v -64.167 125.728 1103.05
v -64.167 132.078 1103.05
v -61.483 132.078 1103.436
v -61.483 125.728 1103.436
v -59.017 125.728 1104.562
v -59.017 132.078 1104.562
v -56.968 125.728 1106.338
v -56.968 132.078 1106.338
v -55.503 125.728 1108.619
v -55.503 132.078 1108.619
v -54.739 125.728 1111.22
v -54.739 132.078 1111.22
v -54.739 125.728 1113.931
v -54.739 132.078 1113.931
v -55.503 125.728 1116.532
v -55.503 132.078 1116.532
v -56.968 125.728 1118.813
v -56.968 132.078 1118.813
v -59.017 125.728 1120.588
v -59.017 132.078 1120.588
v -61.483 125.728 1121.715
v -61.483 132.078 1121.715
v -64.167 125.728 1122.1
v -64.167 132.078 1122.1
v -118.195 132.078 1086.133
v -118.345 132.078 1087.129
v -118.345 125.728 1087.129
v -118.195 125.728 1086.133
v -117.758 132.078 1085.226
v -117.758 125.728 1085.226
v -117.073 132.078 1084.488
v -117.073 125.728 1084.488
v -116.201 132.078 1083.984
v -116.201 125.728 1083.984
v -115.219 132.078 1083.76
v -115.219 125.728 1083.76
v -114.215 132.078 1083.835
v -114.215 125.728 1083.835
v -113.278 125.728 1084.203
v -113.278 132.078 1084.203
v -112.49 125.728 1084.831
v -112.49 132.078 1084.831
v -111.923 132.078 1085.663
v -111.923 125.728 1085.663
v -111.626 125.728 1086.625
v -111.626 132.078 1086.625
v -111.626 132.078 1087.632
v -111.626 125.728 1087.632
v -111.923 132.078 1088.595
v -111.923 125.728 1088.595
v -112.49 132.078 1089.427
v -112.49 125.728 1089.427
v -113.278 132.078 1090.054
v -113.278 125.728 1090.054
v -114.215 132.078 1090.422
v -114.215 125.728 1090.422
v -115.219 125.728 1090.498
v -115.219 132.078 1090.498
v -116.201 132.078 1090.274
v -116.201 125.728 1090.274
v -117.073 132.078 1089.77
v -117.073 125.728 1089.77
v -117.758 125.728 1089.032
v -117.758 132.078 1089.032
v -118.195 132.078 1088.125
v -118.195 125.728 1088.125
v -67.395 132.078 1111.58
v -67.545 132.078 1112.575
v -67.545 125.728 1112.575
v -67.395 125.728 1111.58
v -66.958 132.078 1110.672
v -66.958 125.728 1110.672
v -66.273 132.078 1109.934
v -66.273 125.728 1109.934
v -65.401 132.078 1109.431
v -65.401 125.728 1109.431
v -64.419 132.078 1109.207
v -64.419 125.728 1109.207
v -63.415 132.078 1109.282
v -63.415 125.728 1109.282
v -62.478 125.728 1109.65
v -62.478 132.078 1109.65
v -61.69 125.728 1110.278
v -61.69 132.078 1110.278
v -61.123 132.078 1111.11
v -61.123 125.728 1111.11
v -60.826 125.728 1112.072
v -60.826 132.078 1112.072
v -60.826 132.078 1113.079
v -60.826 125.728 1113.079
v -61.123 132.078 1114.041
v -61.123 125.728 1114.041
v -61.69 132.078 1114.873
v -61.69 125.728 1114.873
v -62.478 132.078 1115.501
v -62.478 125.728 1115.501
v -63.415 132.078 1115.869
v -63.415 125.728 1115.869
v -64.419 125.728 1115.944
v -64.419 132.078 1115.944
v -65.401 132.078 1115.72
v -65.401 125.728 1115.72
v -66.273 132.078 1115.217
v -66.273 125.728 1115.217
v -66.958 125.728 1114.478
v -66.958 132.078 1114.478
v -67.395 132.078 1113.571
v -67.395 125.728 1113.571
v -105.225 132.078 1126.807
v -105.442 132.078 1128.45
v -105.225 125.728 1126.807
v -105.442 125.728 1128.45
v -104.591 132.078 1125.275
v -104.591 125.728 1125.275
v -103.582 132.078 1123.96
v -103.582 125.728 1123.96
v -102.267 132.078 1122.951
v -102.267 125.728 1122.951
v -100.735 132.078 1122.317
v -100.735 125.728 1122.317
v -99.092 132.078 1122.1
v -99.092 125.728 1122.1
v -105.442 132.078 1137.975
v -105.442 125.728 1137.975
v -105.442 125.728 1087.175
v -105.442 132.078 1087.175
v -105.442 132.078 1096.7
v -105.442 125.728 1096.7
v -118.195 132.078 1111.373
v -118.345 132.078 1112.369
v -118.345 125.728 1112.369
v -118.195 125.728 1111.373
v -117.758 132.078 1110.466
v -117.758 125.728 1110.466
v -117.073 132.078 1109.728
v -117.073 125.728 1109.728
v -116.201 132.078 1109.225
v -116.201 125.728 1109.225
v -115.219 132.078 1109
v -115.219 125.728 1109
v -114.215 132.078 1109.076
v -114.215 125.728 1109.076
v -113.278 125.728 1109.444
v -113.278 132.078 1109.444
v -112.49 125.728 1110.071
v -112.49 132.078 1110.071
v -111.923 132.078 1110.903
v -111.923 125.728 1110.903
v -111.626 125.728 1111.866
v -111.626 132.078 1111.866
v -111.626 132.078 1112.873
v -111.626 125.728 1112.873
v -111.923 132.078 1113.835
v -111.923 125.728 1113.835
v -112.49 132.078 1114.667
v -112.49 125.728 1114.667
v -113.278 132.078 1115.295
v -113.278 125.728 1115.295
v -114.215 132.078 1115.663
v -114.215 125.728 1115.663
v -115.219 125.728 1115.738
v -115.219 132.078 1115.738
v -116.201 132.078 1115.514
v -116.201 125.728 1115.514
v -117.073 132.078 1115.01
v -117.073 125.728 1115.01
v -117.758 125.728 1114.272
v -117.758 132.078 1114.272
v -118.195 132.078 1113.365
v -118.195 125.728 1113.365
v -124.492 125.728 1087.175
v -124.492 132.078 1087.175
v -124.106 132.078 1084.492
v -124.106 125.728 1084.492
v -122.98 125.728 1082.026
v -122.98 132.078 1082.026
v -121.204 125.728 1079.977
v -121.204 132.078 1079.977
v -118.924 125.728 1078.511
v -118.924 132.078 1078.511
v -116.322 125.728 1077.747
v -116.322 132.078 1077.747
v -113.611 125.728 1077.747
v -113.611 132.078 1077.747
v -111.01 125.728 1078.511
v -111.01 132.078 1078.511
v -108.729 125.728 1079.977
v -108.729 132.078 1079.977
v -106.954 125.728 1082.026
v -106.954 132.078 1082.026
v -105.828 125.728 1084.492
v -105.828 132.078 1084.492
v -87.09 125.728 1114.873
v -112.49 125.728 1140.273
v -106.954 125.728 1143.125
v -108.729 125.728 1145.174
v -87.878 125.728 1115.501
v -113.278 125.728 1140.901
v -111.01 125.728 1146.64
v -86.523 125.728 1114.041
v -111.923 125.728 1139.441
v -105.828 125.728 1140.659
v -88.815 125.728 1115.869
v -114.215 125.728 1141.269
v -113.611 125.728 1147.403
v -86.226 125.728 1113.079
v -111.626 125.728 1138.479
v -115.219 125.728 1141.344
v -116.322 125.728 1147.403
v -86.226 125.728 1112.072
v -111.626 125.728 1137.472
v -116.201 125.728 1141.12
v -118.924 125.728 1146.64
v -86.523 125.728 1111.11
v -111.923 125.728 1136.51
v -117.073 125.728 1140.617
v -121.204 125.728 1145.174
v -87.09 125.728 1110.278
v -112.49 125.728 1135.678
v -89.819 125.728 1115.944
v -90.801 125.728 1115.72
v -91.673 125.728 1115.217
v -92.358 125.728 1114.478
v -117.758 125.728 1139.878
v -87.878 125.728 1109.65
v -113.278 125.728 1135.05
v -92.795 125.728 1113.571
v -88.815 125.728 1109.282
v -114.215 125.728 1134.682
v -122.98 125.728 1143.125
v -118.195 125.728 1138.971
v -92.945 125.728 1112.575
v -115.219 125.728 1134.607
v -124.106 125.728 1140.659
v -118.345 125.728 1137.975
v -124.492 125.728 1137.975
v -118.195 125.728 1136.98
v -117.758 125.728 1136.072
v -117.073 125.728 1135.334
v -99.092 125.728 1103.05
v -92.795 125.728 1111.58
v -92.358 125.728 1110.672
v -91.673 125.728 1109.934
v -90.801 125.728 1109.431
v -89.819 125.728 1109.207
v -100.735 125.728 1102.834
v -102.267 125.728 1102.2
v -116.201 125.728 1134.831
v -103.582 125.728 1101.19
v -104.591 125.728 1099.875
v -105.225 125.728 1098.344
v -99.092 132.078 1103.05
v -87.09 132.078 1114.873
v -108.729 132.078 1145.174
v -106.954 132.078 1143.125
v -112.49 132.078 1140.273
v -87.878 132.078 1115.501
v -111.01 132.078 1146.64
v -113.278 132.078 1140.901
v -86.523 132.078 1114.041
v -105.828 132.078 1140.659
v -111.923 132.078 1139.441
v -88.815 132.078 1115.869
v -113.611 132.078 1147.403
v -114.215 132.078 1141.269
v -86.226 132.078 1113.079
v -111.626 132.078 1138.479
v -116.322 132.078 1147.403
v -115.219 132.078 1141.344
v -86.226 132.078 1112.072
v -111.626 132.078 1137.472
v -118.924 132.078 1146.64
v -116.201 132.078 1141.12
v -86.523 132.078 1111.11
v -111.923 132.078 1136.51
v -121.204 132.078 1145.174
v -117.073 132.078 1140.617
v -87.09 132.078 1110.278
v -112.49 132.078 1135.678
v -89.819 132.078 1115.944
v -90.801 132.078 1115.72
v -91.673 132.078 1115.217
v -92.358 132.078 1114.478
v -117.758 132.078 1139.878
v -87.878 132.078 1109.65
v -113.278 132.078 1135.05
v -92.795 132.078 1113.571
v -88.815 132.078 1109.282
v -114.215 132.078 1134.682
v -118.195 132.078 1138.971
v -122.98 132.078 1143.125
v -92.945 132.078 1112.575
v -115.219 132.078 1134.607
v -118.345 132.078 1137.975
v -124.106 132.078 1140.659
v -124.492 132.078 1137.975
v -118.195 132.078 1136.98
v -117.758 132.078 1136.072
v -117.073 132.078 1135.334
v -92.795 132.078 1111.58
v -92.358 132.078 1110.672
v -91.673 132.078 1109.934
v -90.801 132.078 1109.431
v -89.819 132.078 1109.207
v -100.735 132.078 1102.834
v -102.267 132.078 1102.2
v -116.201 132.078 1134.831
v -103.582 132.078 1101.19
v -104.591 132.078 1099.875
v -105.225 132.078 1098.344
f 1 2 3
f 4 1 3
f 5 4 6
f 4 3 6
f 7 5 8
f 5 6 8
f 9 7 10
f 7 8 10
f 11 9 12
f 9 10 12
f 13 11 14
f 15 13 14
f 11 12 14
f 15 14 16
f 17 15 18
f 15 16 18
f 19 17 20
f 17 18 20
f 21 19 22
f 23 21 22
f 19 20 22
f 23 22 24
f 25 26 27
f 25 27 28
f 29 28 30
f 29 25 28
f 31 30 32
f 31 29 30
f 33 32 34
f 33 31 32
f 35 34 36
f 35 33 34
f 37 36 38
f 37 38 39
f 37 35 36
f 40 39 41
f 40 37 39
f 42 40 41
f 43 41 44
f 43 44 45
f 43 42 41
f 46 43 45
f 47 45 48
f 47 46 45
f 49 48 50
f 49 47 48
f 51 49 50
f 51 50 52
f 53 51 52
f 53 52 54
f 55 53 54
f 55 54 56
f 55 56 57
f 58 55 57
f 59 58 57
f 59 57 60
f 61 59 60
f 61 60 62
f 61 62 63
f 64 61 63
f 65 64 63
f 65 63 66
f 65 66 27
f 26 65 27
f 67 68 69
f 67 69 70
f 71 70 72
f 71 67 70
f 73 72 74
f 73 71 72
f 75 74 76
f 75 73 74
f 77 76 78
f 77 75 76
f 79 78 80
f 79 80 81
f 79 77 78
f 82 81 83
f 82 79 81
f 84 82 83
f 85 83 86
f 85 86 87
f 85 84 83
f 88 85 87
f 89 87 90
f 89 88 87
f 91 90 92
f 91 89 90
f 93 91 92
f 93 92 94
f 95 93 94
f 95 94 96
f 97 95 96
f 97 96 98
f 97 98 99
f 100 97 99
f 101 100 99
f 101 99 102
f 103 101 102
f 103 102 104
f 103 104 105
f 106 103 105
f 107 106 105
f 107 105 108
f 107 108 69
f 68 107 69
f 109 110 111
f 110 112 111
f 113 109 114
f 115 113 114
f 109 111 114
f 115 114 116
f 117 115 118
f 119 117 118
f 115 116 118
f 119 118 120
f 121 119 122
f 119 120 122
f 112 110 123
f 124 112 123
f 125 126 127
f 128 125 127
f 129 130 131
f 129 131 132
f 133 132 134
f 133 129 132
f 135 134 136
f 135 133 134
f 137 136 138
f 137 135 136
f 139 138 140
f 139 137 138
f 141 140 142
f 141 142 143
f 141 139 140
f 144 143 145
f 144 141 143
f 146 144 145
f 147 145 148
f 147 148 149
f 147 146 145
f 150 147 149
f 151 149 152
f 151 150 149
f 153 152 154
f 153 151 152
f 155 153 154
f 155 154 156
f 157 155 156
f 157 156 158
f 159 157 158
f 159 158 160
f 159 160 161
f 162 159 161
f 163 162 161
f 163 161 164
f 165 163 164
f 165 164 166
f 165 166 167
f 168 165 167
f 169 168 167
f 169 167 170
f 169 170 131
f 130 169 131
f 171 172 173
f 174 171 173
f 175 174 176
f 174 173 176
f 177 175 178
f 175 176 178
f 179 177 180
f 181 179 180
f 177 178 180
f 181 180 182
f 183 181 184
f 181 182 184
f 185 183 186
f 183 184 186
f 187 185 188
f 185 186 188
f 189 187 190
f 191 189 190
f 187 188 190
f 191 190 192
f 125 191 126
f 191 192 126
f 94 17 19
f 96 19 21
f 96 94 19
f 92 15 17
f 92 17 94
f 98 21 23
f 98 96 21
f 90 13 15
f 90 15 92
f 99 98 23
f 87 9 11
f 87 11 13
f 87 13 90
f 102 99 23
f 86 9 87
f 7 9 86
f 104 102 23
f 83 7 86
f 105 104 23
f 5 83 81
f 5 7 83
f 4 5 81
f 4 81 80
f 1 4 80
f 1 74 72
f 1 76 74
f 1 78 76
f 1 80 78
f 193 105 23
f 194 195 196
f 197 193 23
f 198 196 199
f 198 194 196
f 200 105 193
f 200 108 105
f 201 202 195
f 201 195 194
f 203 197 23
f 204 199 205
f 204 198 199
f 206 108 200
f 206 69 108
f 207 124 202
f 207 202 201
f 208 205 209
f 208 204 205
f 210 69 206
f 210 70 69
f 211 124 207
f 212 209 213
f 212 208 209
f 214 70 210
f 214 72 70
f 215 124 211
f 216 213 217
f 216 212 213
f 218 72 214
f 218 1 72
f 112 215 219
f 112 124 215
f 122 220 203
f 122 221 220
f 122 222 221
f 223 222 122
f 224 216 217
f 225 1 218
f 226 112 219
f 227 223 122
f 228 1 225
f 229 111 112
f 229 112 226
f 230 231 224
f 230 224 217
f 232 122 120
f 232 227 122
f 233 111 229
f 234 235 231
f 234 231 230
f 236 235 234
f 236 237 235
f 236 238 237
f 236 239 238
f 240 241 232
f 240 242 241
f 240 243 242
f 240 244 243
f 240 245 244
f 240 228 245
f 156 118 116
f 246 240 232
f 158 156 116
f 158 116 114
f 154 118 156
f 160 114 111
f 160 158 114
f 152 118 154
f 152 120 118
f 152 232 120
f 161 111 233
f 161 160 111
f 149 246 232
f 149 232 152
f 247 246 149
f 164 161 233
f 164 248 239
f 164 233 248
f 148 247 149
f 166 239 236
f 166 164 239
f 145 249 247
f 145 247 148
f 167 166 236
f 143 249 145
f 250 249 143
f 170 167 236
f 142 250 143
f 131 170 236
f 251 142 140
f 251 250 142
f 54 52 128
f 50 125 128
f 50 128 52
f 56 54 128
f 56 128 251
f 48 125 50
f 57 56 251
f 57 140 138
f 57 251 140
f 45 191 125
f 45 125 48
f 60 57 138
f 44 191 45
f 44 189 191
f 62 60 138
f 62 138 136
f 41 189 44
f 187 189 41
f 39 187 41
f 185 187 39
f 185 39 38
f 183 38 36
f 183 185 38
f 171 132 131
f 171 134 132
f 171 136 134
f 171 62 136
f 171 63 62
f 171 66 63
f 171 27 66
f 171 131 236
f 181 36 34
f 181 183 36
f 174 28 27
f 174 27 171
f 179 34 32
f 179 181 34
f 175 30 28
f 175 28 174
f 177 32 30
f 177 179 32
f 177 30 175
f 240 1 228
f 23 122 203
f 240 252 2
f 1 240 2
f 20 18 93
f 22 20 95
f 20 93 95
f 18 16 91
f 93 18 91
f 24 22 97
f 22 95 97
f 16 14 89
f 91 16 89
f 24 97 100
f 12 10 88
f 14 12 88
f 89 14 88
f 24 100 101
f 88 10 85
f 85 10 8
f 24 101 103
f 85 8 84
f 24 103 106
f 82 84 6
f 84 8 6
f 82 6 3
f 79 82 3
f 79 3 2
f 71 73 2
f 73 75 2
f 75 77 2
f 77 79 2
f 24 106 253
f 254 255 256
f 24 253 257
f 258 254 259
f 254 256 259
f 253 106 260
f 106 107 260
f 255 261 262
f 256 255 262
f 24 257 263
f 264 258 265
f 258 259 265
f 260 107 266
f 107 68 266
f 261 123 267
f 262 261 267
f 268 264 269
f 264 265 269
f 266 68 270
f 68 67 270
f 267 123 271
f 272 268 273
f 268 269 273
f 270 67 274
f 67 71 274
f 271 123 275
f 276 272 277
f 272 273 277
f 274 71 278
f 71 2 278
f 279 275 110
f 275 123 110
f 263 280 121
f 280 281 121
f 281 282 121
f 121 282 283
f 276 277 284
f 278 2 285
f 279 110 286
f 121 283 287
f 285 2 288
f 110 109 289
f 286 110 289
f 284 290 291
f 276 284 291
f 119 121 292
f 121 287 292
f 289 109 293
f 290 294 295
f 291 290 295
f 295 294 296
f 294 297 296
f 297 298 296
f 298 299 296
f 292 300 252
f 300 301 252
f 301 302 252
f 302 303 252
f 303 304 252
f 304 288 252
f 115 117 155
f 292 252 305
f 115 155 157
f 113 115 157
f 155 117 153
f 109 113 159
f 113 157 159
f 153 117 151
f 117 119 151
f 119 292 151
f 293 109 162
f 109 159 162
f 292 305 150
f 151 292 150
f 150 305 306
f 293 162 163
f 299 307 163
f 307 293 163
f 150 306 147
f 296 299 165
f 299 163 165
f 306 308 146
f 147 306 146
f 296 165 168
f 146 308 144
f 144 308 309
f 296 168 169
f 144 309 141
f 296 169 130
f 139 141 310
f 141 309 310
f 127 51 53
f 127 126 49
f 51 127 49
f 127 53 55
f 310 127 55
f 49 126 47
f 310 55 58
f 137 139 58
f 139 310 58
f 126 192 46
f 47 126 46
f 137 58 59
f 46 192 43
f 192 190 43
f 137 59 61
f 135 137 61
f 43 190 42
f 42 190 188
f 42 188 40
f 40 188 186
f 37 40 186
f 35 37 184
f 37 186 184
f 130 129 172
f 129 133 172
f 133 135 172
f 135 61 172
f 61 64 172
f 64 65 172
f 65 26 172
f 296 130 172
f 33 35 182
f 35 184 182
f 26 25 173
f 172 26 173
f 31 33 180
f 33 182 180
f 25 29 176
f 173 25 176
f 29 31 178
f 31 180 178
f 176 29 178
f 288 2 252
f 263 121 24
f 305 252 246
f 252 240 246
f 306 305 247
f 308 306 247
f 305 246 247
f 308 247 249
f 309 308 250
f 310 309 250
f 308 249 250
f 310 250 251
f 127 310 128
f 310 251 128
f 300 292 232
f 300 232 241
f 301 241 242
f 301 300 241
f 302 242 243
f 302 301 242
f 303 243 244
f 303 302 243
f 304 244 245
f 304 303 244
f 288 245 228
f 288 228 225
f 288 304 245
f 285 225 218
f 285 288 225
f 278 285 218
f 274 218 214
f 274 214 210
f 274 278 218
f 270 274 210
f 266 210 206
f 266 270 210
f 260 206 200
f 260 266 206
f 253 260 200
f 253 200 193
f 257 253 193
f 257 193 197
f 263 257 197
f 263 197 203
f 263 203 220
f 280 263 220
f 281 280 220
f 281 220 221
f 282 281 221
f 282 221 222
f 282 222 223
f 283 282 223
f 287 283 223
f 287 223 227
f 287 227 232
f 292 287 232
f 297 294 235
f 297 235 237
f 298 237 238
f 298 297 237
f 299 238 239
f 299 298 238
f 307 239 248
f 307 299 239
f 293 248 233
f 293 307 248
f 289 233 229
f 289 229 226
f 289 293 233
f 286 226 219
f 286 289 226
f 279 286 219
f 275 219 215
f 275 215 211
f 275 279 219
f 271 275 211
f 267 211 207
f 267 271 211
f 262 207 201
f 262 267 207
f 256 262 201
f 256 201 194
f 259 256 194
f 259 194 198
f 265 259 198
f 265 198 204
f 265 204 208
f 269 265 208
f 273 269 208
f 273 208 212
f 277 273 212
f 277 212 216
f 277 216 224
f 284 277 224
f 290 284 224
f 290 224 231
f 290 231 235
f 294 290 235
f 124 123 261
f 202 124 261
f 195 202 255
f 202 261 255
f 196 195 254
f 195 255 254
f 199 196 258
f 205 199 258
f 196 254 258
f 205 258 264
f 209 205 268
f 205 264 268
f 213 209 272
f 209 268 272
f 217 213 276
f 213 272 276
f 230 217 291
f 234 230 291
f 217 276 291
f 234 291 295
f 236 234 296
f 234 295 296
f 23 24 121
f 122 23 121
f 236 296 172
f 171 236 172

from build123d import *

# Parameters (mm, degrees)
BOSS_EXTRUDE1_START     = 12.827
BOSS_EXTRUDE1_DEPTH     = 6.35
F_1_4_CLEARANCE_HOLE1_D = 6.7564
FILLET1_R               = 6.35


with BuildPart() as part:
    # Sketch1 → Boss-Extrude1 (new body)
    with BuildSketch(Plane(origin=(0, 144.904574554, 0), x_dir=(-1, 0, 0), z_dir=(0, -1, 0)).offset(BOSS_EXTRUDE1_START)):
        with BuildLine():
            Line((-105.441812484, -1122.100334154), (-105.441812484, -1137.975334154))
            ThreePointArc((-105.441812484, -1137.975334154), (-114.966812484, -1147.500334154), (-124.491812484, -1137.975334154))
            Line((-124.491812484, -1137.975334154), (-124.491812484, -1087.175334154))
            ThreePointArc((-124.491812484, -1087.175334154), (-114.966812484, -1077.650334154), (-105.441812484, -1087.175334154))
            Line((-105.441812484, -1087.175334154), (-105.441812484, -1103.050334154))
            Line((-105.441812484, -1103.050334154), (-64.166812484, -1103.050334154))
            ThreePointArc((-64.166812484, -1103.050334154), (-54.641812484, -1112.575334154), (-64.166812484, -1122.100334154))
            Line((-64.166812484, -1122.100334154), (-105.441812484, -1122.100334154))
        make_face()
    extrude(amount=BOSS_EXTRUDE1_DEPTH)

    # 1/4 Clearance Hole1 (through all)
    with Locations(Plane(origin=(0, 125.727574554, 0), x_dir=(-1, 0, 0), z_dir=(0, -1, 0))):
        with Locations((-114.966812484, -1137.975334154), (-114.966812484, -1112.369211098), (-114.966812484, -1087.128841033), (-64.166812484, -1112.575334154), (-89.566812484, -1112.575334154)):
            Hole(F_1_4_CLEARANCE_HOLE1_D / 2)


with BuildPart() as body_2:
    # Mirror1: mirrored copy
    add(part.part.mirror(Plane(origin=(0, 0, 0), x_dir=(0, 0, 1), z_dir=(1, 0, 0))))

    # Fillet1
    fillet1_edges = [body_2.edges().sort_by_distance(p)[0] for p in [
        (-105.441812484, 128.902574554, 1122.100334154),
        (-105.441812484, 128.902574554, 1103.050334154),
    ]]
    fillet(fillet1_edges, radius=FILLET1_R)


solid = body_2.part
